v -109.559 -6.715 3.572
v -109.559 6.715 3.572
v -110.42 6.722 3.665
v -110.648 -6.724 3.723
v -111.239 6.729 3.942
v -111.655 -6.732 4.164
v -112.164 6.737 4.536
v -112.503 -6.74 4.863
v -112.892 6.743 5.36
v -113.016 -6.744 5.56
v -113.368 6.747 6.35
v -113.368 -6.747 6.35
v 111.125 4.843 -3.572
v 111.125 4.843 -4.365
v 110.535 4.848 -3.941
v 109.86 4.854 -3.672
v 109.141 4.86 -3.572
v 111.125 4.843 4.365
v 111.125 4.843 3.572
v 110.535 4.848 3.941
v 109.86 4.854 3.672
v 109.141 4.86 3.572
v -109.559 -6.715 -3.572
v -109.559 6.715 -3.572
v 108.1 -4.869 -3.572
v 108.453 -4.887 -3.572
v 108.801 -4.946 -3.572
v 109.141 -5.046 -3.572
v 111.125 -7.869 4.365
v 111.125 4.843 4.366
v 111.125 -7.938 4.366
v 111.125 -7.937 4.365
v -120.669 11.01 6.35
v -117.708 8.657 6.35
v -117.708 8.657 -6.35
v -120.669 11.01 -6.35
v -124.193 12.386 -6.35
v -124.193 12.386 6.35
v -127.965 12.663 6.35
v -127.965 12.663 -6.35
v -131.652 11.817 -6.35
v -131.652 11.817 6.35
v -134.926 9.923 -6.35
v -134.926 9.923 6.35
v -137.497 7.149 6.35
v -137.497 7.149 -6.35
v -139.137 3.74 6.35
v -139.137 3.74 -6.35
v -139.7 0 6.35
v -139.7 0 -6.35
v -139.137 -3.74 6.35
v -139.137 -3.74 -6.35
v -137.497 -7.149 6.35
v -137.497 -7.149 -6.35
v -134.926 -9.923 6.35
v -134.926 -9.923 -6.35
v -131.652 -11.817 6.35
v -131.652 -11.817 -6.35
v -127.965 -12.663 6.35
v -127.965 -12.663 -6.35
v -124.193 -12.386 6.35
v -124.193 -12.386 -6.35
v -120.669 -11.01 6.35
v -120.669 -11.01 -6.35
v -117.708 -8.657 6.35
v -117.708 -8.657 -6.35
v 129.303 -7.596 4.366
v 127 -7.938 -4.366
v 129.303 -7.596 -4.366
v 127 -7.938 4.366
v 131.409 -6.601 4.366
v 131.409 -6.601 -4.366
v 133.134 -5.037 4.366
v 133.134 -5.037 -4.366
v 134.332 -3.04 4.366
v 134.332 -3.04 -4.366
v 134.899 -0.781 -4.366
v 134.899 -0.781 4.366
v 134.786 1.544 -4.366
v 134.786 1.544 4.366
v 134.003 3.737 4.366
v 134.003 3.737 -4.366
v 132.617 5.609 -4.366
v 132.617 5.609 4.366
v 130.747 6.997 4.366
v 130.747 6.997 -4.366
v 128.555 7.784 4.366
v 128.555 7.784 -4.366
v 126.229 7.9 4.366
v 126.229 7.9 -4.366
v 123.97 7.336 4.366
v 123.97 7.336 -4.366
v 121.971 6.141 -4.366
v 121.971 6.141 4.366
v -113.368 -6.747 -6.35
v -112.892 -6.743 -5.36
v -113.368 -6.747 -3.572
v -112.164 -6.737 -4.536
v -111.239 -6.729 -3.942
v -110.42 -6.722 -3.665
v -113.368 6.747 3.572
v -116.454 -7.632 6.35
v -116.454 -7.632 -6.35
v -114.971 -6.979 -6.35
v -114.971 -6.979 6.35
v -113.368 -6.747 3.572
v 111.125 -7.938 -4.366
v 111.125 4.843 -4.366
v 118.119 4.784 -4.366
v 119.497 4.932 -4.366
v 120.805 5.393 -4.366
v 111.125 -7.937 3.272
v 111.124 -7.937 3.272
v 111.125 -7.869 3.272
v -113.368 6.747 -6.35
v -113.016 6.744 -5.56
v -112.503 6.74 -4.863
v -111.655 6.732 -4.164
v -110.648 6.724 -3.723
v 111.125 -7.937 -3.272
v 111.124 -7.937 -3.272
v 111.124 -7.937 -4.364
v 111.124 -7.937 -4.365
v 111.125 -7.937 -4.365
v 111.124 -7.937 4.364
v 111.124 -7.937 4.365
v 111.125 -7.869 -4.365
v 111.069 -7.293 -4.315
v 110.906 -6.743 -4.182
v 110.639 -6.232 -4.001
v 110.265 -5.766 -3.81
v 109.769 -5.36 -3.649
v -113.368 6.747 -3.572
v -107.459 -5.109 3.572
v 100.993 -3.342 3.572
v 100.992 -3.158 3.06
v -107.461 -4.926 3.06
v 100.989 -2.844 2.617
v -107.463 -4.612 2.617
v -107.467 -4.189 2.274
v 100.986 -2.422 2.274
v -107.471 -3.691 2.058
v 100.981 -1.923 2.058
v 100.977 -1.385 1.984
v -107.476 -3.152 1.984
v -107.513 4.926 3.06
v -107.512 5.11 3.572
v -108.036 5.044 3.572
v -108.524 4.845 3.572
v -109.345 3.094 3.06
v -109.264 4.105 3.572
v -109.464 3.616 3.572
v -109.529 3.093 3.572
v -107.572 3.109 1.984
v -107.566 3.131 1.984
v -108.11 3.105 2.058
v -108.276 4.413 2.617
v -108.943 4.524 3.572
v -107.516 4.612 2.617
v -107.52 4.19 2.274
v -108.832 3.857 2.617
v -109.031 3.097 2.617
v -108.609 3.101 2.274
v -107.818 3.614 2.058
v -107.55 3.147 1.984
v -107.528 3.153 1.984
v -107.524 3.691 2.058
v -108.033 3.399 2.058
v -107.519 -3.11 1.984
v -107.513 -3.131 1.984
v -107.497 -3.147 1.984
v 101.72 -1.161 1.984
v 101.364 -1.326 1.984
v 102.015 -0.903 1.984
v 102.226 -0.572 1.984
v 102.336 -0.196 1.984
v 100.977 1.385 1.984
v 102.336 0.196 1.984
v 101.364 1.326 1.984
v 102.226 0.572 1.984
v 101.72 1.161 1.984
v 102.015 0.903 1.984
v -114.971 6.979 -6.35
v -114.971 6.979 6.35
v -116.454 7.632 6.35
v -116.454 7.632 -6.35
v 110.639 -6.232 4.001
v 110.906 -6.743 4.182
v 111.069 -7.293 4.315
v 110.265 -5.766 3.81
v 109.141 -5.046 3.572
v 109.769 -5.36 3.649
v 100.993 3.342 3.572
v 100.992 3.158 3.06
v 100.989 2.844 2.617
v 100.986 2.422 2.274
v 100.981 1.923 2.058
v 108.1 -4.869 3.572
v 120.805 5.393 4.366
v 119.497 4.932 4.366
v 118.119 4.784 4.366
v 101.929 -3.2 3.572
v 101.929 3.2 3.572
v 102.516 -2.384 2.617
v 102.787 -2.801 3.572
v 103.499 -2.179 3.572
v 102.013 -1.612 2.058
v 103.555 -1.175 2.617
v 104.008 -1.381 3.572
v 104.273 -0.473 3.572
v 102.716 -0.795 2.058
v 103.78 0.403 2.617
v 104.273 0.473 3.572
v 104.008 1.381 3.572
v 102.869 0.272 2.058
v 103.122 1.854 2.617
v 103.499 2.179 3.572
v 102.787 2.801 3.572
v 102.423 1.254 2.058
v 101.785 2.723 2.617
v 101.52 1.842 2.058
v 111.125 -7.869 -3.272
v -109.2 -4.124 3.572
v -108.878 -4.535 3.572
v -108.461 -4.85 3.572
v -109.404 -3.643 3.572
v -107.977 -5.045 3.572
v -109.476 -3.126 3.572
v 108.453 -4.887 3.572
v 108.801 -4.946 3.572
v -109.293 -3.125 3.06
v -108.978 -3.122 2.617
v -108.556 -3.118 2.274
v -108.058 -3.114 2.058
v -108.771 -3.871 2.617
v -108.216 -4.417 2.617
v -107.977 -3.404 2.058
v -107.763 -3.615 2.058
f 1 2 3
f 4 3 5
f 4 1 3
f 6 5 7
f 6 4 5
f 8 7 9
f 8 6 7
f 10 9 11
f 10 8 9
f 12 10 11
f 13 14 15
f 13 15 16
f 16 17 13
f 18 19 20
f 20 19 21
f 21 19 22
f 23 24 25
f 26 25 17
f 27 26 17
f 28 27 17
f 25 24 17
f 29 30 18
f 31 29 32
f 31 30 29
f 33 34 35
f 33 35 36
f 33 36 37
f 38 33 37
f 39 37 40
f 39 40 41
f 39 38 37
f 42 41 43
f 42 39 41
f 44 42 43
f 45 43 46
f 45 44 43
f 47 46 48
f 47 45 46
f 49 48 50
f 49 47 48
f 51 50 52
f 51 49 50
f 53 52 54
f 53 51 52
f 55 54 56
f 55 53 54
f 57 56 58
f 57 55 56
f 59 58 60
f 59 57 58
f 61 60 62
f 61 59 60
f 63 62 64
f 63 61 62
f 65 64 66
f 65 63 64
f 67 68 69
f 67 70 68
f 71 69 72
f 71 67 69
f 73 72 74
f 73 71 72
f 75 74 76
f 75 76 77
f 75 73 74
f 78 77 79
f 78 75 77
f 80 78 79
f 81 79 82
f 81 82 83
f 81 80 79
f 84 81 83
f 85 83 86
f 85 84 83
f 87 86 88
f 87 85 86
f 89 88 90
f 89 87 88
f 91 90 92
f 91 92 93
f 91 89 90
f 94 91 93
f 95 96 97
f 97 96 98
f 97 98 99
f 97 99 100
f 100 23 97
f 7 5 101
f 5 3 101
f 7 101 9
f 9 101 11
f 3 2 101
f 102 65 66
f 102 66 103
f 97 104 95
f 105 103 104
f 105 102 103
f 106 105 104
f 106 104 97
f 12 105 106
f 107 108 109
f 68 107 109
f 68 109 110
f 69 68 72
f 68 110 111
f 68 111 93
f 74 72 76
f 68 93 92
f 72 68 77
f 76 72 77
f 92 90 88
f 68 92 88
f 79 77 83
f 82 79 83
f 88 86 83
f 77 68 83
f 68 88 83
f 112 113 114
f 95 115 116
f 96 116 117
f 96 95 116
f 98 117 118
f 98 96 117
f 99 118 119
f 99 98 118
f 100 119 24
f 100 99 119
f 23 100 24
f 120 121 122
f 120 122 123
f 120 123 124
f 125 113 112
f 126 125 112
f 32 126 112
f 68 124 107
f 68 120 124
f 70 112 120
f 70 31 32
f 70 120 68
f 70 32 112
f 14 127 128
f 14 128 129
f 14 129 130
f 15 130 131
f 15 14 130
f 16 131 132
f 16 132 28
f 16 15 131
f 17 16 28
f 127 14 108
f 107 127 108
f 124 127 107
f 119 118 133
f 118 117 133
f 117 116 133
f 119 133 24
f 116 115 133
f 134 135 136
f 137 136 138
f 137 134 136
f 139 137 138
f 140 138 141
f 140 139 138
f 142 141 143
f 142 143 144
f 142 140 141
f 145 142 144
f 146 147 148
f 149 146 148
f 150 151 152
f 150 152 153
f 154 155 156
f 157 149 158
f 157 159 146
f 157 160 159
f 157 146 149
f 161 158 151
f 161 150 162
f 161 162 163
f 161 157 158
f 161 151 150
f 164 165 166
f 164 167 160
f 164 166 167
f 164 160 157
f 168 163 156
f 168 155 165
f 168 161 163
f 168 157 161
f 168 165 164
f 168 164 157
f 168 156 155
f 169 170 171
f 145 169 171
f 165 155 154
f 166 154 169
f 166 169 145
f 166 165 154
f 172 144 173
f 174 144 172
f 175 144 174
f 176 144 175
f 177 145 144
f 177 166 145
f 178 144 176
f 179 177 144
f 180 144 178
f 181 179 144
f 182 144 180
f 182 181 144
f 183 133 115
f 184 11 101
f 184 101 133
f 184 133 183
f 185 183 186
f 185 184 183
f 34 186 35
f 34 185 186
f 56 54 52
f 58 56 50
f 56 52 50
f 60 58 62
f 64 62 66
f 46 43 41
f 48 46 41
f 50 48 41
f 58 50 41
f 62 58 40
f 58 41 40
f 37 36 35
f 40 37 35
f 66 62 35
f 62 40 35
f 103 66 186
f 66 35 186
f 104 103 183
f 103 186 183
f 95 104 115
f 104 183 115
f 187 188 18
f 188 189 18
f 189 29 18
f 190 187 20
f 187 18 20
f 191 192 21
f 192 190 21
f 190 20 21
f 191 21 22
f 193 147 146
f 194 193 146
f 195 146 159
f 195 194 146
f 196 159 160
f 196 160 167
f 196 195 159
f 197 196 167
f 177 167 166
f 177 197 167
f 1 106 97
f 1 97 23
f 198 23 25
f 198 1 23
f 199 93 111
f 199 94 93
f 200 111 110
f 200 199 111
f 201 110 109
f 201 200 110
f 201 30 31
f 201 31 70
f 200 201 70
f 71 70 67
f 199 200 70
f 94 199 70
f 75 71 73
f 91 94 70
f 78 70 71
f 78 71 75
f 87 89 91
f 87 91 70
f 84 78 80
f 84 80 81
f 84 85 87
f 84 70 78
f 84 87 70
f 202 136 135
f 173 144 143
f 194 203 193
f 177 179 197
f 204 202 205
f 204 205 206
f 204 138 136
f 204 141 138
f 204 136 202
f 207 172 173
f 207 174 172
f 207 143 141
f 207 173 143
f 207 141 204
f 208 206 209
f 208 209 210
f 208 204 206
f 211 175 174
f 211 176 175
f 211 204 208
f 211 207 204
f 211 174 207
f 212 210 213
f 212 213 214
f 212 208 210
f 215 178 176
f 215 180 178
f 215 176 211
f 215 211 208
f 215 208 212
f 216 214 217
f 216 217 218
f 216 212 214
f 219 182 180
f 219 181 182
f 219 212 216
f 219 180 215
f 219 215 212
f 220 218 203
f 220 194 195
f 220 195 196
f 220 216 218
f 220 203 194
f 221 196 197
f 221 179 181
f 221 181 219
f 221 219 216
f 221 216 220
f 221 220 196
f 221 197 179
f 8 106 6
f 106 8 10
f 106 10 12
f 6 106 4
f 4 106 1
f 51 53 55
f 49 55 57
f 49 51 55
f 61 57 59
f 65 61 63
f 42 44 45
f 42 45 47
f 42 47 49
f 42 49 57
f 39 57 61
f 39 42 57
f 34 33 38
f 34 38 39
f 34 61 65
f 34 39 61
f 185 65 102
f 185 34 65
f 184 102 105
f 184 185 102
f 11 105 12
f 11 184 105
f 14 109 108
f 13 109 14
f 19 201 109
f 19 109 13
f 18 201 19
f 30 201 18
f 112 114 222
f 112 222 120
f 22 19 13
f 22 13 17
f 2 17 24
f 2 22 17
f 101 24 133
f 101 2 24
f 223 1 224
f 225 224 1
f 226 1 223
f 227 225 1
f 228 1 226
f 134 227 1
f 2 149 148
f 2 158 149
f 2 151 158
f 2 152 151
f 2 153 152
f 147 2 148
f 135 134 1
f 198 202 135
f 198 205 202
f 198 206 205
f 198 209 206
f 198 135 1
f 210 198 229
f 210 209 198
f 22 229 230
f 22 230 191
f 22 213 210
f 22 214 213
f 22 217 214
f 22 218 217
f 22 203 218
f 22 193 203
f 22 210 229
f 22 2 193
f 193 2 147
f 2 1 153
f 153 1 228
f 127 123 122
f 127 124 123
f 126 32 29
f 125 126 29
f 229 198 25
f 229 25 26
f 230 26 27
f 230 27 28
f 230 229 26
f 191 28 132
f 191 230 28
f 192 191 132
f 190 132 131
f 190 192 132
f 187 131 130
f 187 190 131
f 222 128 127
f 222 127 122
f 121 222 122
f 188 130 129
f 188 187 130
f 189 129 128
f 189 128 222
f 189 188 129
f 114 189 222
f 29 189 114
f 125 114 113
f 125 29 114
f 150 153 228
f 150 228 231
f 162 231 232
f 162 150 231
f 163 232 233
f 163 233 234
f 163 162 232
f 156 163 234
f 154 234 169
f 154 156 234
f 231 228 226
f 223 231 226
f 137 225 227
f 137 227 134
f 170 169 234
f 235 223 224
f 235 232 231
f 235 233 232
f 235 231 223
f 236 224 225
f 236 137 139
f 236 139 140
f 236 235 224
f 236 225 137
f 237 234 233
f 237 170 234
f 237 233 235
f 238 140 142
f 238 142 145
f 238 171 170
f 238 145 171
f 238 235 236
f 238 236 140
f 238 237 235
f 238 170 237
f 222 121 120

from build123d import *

# Parameters (mm, degrees)
F1_DEPTH     = 3.571875
F2_DEPTH     = 6.35
F3_DEPTH     = 4.365625
F4_T4_DEPTH  = 32.5377920371
F4_T10_DEPTH = 32.5377920371
F5_T4_DEPTH  = 22.8781953851
F5_S7_R      = 3
F5_T8_DEPTH  = 13
F5_T12_DEPTH = 22.8781953851
F5_S15_R     = 3
F5_T16_DEPTH = 13
F7_DEPTH     = 1.5875
F8_T1_DEPTH  = 208.4599958687
F8_T3_DEPTH  = 208.5127323296
F8_T5_DEPTH  = 6.2192364317
F8_T8_ANGLE  = 90
F8_T10_ANGLE = 179.0283359547
F8_T12_ANGLE = 90.9716640453


# Not quite as in the source:
# - a fillet or chamfer that OpenCascade refuses, or shapes differently, is made with other operations: its cross-section is extruded or revolved along the edge and cut away or added


with BuildPart() as f1:
    # F0 (on Top) → F1 (new body, symmetric)
    with BuildSketch(Plane.XY):
        with BuildLine():
            ThreePointArc((-113.3683072515, 6.746875), (-115.7345796972, 7.2550843623), (-117.7075605328, 8.656822093))
            ThreePointArc((-117.7075605328, 8.656822093), (-139.7, 0), (-117.7075605328, -8.656822093))
            ThreePointArc((-117.7075605328, -8.656822093), (-115.7345796972, -7.2550843623), (-113.3683072515, -6.746875))
            Line((-113.3683072515, -6.746875), (-113.3683072515, 6.746875))
        make_face()
        with BuildLine():
            Line((111.125, 4.8432679198), (-113.3683072515, 6.746875))
            Line((-113.3683072515, 6.746875), (-113.3683072515, -6.746875))
            Line((-113.3683072515, -6.746875), (108.0995621996, -4.8689223364))
            ThreePointArc((108.0995621996, -4.8689223364), (110.2373075769, -5.7385195078), (111.125, -7.8688144875))
            Line((111.125, -7.8688144875), (111.125, 4.8432679198))
        make_face()
        with BuildLine():
            Line((118.1193570388, 4.7839587683), (111.125, 4.8432679198))
            Line((111.125, 4.8432679198), (111.125, -7.8688144875))
            Line((111.125, -7.8688144875), (111.125, -7.9375))
            Line((111.125, -7.9375), (127, -7.9375))
            ThreePointArc((127, -7.9375), (134.4750044007, 2.6698718057), (121.9713880952, 6.141414215))
            ThreePointArc((121.9713880952, 6.141414215), (120.1644294879, 5.1248404445), (118.1193570388, 4.7839587683))
        make_face()
    extrude(amount=F1_DEPTH, both=True)

    # F0 (on Top) → F2 (join, symmetric)
    with BuildSketch(Plane.XY):
        with BuildLine():
            ThreePointArc((-113.3683072515, 6.746875), (-115.7345796972, 7.2550843623), (-117.7075605328, 8.656822093))
            ThreePointArc((-117.7075605328, 8.656822093), (-139.7, 0), (-117.7075605328, -8.656822093))
            ThreePointArc((-117.7075605328, -8.656822093), (-115.7345796972, -7.2550843623), (-113.3683072515, -6.746875))
            Line((-113.3683072515, -6.746875), (-113.3683072515, 6.746875))
        make_face()
    extrude(amount=F2_DEPTH, both=True)

    # F0 (on Top) → F3 (join, symmetric)
    with BuildSketch(Plane.XY):
        with BuildLine():
            Line((118.1193570388, 4.7839587683), (111.125, 4.8432679198))
            Line((111.125, 4.8432679198), (111.125, -7.8688144875))
            Line((111.125, -7.8688144875), (111.125, -7.9375))
            Line((111.125, -7.9375), (127, -7.9375))
            ThreePointArc((127, -7.9375), (134.4750044007, 2.6698718057), (121.9713880952, 6.141414215))
            ThreePointArc((121.9713880952, 6.141414215), (120.1644294879, 5.1248404445), (118.1193570388, 4.7839587683))
        make_face()
    extrude(amount=F3_DEPTH, both=True)

    # F4: fillet of radius 4 on 2 edges, made by hand


with BuildPart() as f4_tool2:
    # F4_s3 → F4_t4 (new body)
    with BuildSketch(Plane.XZ.offset(16.2688960185)):
        with BuildLine():
            ThreePointArc((-109.5594988441, 3.571875), (-111.9166687573, 4.3401958699), (-113.3683072515, 6.35))
            Line((-113.3683072515, 6.35), (-113.3683072515, 3.571875))
            Line((-113.3683072515, 3.571875), (-109.5594988441, 3.571875))
        make_face()
    extrude(amount=-F4_T4_DEPTH)

    split(bisect_by=Plane(origin=(0.0490555459, 5.7851443476, 0), x_dir=(0, 0, 1), z_dir=(-0.0084792668, -0.9999640504, 0)), keep=Keep.TOP)

    split(bisect_by=Plane(origin=(0.0490555459, -5.7851443476, 0), x_dir=(0, 0, 1), z_dir=(-0.0084792668, 0.9999640504, 0)), keep=Keep.TOP)


with BuildPart() as f1_1:
    add(f1.part)

    # F4_t1: union F4_tool2
    add(f4_tool2.part)


with BuildPart() as f4_tool8:
    # F4_s9 → F4_t10 (new body)
    with BuildSketch(Plane.XZ.offset(16.2688960185)):
        with BuildLine():
            ThreePointArc((-113.3683072515, -6.35), (-111.9166687573, -4.3401958699), (-109.5594988441, -3.571875))
            Line((-109.5594988441, -3.571875), (-113.3683072515, -3.571875))
            Line((-113.3683072515, -3.571875), (-113.3683072515, -6.35))
        make_face()
    extrude(amount=-F4_T10_DEPTH)

    split(bisect_by=Plane(origin=(0.0490555459, 5.7851443476, 0), x_dir=(0, 0, 1), z_dir=(-0.0084792668, -0.9999640504, 0)), keep=Keep.TOP)

    split(bisect_by=Plane(origin=(0.0490555459, -5.7851443476, 0), x_dir=(0, 0, 1), z_dir=(-0.0084792668, 0.9999640504, 0)), keep=Keep.TOP)


with BuildPart() as f1_2:
    add(f1_1.part)

    # F4_t7: union F4_tool8
    add(f4_tool8.part)

    # F5: fillet of radius 3 on 2 edges, made by hand


with BuildPart() as f5_tool2:
    # F5_s3 → F5_t4 (new body)
    with BuildSketch(Plane.XZ.offset(-9.9263244087)):
        with BuildLine():
            ThreePointArc((111.1252710091, -4.3653307993), (110.1832561552, -3.7769740577), (109.0917774438, -3.571475))
            Line((109.0917774438, -3.571475), (109.0917774438, -3.2713384315))
            ThreePointArc((109.0917774438, -3.2713384315), (110.1083887219, -3.2717384315), (111.125, -3.2717384315))
            Line((111.125, -3.2717384315), (111.4251365685, -3.571875))
            ThreePointArc((111.4251365685, -3.571875), (111.4251365685, -3.9686028996), (111.3286203656, -4.1445798107))
            Line((111.3286203656, -4.1445798107), (111.1252710091, -4.3653307993))
        make_face()
    extrude(amount=F5_T4_DEPTH)

    split(bisect_by=Plane(origin=(0.0490555459, 5.7851443476, 0), x_dir=(0, 0, 1), z_dir=(-0.0084792668, -0.9999640504, 0)), keep=Keep.TOP)

    split(bisect_by=Plane.XZ.offset(7.9375), keep=Keep.BOTTOM)

    # F5_s7 → F5_t8 (cut, symmetric)
    with BuildSketch(Plane.XY.offset(-3.8)):
        with Locations((108.125, -7.8688144875)):
            Circle(F5_S7_R)
    extrude(amount=F5_T8_DEPTH, both=True, mode=Mode.SUBTRACT)


with BuildPart() as f1_3:
    add(f1_2.part)

    # F5_t1: union F5_tool2
    add(f5_tool2.part)


with BuildPart() as f5_tool10:
    # F5_s11 → F5_t12 (new body)
    with BuildSketch(Plane.XZ.offset(-9.9263244087)):
        with BuildLine():
            ThreePointArc((111.1252710091, 4.3653307993), (110.1832561552, 3.7769740577), (109.0917774438, 3.571475))
            Line((109.0917774438, 3.571475), (109.0917774438, 3.2713384315))
            ThreePointArc((109.0917774438, 3.2713384315), (110.1083887219, 3.2717384315), (111.125, 3.2717384315))
            Line((111.125, 3.2717384315), (111.4251365685, 3.571875))
            ThreePointArc((111.4251365685, 3.571875), (111.4251365685, 3.9686028996), (111.3286203656, 4.1445798107))
            Line((111.3286203656, 4.1445798107), (111.1252710091, 4.3653307993))
        make_face()
    extrude(amount=F5_T12_DEPTH)

    split(bisect_by=Plane(origin=(0.0490555459, 5.7851443476, 0), x_dir=(0, 0, 1), z_dir=(-0.0084792668, -0.9999640504, 0)), keep=Keep.TOP)

    split(bisect_by=Plane.XZ.offset(7.9375), keep=Keep.BOTTOM)

    # F5_s15 → F5_t16 (cut, symmetric)
    with BuildSketch(Plane.XY.offset(3.8)):
        with Locations((108.125, -7.8688144875)):
            Circle(F5_S15_R)
    extrude(amount=F5_T16_DEPTH, both=True, mode=Mode.SUBTRACT)


with BuildPart() as f1_4:
    add(f1_3.part)

    # F5_t9: union F5_tool10
    add(f5_tool10.part)

    # F6 (on face) → F7 (cut)
    with BuildSketch(Plane.XY.offset(3.571875)):
        with BuildLine():
            Line((-107.4591662774, -5.1092109437), (100.9933355318, -3.3416230224))
            ThreePointArc((100.9933355318, -3.3416230224), (104.3067431568, 0), (100.9933355318, 3.3416230224))
            Line((100.9933355318, 3.3416230224), (-107.5119008424, 5.1096581102))
            ThreePointArc((-107.5119008424, 5.1096581102), (-108.9430729384, 4.5239435719), (-109.5287874768, 3.0927714759))
            Line((-109.5287874768, 3.0927714759), (-109.4760529118, -3.1262413766))
            ThreePointArc((-109.4760529118, -3.1262413766), (-108.8782960389, -4.535437059), (-107.4591662774, -5.1092109437))
        make_face()
    extrude(amount=-F7_DEPTH, mode=Mode.SUBTRACT)

    # F8: fillet of radius 2 on 1 edges, made by hand

    # F8_s2 → F8_t1 (join)
    with BuildSketch(Plane(origin=(-107.4947609873, -0.9115095261, 0), x_dir=(0, 0, 1), z_dir=(0.9999640504, 0.0084792668, 0))):
        with BuildLine():
            ThreePointArc((3.571875, 4.1978523289), (2.4311525433, 3.5008139871), (1.984375, 2.2408536702))
            Line((1.984375, 2.2408536702), (1.984375, 4.1978523289))
            Line((1.984375, 4.1978523289), (3.571875, 4.1978523289))
        make_face()
    extrude(amount=F8_T1_DEPTH)

    # F8_s4 → F8_t3 (join)
    with BuildSketch(Plane(origin=(100.9577408219, -0.8560783953, 0), x_dir=(0, 0, 1), z_dir=(-0.9999640504, 0.0084792668, 0))):
        with BuildLine():
            ThreePointArc((3.571875, 4.1978523289), (2.4311525433, 3.5008139871), (1.984375, 2.2408536702))
            Line((1.984375, 2.2408536702), (1.984375, 4.1978523289))
            Line((1.984375, 4.1978523289), (3.571875, 4.1978523289))
        make_face()
    extrude(amount=F8_T3_DEPTH)

    # F8_s6 → F8_t5 (join)
    with BuildSketch(Plane(origin=(-0.0340983887, 4.0212395356, 0), x_dir=(0, 0, 1), z_dir=(0.0084792668, -0.9999640504, 0))):
        with BuildLine():
            ThreePointArc((3.571875, 109.498625523), (2.4311525433, 108.8015871812), (1.984375, 107.5416268643))
            Line((1.984375, 107.5416268643), (1.984375, 109.498625523))
            Line((1.984375, 109.498625523), (3.571875, 109.498625523))
        make_face()
    extrude(amount=F8_T5_DEPTH)

    # F8_s7 → F8_t8 (revolve)
    with BuildSketch(Plane(origin=(0.0186361763, -2.1977733169, 0), x_dir=(0, 0, 1), z_dir=(-0.0084792668, 0.9999640504, 0))):
        with BuildLine():
            ThreePointArc((3.571875, -109.498625523), (2.4311525433, -108.8015871812), (1.984375, -107.5416268643))
            Line((1.984375, -107.5416268643), (1.984375, -109.498625523))
            Line((1.984375, -109.498625523), (3.571875, -109.498625523))
        make_face()
    revolve(axis=Axis((-107.476124811, -3.109282843, 1.984375), (0, 0, 1)), revolution_arc=F8_T8_ANGLE)

    # F8_s9 → F8_t10 (revolve)
    with BuildSketch(Plane(origin=(100.9577408219, 0.8560783953, 0), x_dir=(0, 0, 1), z_dir=(-0.9999640504, -0.0084792668, 0))):
        with BuildLine():
            ThreePointArc((3.571875, -4.1978523289), (2.4311525433, -3.5008139871), (1.984375, -2.2408536702))
            Line((1.984375, -2.2408536702), (1.984375, -4.1978523289))
            Line((1.984375, -4.1978523289), (3.571875, -4.1978523289))
        make_face()
    revolve(axis=Axis((100.965, 0, 1.984375), (0, 0, 1)), revolution_arc=F8_T10_ANGLE)

    # F8_s11 → F8_t12 (revolve)
    with BuildSketch(Plane(origin=(-107.5474955523, 0.9119566926, 0), x_dir=(0, 0, 1), z_dir=(0.9999640504, -0.0084792668, 0))):
        with BuildLine():
            ThreePointArc((3.571875, -4.1978523289), (2.4311525433, -3.5008139871), (1.984375, -2.2408536702))
            Line((1.984375, -2.2408536702), (1.984375, -4.1978523289))
            Line((1.984375, -4.1978523289), (3.571875, -4.1978523289))
        make_face()
    revolve(axis=Axis((-107.528859376, 3.1097300095, 1.984375), (0, 0, 1)), revolution_arc=F8_T12_ANGLE)


solid = f1_4.part
